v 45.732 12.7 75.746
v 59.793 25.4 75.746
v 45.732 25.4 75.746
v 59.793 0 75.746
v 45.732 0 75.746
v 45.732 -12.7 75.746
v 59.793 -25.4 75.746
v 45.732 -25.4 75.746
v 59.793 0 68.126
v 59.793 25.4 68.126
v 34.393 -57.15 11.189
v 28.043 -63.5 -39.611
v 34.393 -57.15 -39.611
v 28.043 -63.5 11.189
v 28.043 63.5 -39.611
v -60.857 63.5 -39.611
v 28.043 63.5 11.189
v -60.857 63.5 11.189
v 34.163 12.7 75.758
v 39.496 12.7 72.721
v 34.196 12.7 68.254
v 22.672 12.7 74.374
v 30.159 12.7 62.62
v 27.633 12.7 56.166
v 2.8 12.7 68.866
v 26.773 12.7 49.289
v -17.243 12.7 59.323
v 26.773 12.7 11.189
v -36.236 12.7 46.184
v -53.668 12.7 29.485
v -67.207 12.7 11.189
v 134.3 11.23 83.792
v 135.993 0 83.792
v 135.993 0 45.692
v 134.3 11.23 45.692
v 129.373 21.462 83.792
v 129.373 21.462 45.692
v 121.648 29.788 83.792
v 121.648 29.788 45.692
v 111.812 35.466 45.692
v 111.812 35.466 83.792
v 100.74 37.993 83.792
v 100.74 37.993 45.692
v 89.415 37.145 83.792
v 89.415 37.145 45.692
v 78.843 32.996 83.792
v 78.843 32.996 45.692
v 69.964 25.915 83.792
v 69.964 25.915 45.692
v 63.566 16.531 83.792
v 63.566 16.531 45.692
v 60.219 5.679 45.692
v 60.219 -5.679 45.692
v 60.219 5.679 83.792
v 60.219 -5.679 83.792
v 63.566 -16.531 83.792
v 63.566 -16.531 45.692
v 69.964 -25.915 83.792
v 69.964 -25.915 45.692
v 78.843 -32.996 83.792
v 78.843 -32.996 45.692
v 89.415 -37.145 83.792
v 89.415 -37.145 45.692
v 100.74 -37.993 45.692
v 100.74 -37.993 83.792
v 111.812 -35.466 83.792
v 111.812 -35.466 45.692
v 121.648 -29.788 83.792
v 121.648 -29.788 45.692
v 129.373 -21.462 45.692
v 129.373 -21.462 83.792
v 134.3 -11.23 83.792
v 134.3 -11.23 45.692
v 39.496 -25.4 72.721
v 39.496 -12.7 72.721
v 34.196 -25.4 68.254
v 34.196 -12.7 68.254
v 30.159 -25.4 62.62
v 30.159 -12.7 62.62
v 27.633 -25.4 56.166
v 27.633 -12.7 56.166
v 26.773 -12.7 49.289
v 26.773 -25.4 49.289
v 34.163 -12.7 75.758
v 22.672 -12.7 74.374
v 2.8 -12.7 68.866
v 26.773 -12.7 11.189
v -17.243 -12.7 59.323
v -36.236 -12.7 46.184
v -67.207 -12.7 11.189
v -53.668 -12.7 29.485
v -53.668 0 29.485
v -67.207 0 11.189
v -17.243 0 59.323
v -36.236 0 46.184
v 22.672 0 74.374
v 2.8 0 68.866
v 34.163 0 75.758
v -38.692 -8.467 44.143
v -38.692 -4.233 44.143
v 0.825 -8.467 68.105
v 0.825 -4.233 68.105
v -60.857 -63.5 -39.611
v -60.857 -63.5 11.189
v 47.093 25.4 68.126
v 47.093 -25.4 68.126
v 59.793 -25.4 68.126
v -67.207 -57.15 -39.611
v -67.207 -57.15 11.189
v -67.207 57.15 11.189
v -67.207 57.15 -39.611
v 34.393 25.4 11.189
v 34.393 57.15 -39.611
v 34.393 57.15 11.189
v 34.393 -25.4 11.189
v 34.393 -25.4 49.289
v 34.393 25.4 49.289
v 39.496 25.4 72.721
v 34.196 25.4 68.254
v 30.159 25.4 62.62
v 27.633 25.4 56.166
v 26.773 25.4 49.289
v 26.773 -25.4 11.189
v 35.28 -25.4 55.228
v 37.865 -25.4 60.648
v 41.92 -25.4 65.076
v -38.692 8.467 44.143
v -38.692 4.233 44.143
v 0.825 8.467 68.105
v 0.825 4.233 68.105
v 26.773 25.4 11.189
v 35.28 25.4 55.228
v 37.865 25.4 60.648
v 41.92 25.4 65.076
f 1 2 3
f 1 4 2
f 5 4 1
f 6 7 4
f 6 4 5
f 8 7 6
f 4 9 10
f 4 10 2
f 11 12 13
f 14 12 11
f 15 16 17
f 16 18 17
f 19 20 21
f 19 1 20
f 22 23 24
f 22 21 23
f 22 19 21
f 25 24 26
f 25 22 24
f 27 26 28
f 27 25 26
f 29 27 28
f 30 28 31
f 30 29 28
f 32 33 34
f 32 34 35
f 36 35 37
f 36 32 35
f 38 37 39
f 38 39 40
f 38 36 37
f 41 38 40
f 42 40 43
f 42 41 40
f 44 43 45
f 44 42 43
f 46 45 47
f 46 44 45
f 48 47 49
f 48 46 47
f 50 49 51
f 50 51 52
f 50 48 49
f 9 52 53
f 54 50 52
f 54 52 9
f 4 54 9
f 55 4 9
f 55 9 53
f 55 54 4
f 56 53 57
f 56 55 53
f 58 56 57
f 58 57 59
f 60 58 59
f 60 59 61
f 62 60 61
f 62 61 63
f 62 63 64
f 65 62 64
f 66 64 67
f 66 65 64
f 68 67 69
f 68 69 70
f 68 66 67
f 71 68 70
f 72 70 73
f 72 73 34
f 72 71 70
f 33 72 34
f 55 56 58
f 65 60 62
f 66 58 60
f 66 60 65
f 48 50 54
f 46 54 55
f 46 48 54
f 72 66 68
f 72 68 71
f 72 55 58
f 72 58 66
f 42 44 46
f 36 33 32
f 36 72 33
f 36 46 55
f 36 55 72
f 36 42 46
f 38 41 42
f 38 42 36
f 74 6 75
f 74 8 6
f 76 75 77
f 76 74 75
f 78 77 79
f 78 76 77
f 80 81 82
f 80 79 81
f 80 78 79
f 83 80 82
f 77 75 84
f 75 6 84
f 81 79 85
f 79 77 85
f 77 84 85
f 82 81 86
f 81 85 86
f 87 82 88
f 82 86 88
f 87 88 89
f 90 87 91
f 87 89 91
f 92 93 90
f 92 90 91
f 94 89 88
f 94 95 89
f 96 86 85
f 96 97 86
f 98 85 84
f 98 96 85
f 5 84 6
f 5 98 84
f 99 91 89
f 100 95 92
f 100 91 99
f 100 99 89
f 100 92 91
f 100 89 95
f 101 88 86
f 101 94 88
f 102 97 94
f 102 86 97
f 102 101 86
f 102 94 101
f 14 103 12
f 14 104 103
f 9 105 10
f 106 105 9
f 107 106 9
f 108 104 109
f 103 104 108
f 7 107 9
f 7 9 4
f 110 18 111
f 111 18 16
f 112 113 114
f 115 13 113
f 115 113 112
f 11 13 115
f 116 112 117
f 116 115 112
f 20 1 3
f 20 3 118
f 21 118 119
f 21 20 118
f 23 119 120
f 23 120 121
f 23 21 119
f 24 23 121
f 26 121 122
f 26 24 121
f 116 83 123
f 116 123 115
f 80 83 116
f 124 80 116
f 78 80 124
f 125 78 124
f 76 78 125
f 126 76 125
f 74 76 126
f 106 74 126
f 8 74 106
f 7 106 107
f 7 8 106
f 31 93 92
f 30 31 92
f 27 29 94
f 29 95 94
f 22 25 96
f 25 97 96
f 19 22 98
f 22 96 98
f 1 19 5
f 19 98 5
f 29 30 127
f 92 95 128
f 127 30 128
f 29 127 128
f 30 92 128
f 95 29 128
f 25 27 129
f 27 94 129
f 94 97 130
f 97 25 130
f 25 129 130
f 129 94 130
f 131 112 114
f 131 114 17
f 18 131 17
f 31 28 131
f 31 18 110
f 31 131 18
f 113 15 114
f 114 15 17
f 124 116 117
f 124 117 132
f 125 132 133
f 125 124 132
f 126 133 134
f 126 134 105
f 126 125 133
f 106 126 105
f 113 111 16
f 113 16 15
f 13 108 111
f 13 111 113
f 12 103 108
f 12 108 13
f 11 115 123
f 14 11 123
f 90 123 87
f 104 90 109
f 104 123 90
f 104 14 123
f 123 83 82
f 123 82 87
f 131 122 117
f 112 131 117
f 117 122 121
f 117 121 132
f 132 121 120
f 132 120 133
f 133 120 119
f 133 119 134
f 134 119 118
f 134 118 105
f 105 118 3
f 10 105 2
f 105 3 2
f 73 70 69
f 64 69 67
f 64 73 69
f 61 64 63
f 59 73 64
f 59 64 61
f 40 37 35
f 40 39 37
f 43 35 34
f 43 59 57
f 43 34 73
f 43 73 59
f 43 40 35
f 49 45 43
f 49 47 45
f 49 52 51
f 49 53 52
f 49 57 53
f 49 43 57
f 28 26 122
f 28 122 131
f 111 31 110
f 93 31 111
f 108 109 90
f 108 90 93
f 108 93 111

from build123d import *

# Parameters (mm, degrees)
F1_DEPTH = 63.5
F2_DEPTH = 25.4
F3_DEPTH = 12.7
F5_SIZE  = 6.35


with BuildPart() as f1:
    # F0 (on Front) → F1 (new body, symmetric)
    with BuildSketch(Plane.XZ):
        Polygon((26.772957, 11.188716), (-67.207043, 11.188716), (-67.207043, -39.611284), (34.392957, -39.611284), (34.392957, 11.188716), align=None)
    extrude(amount=F1_DEPTH, both=True)

    # F0 (on Front) → F2 (join, symmetric)
    with BuildSketch(Plane.XZ):
        with BuildLine():
            Line((26.772957, 49.288716), (26.772957, 11.188716))
            Line((26.772957, 11.188716), (34.392957, 11.188716))
            Line((34.392957, 11.188716), (34.392957, 49.288716))
            ThreePointArc((34.392957, 49.288716), (37.864503, 60.647941), (47.092957, 68.12586))
            Line((47.092957, 68.12586), (59.792957, 68.12586))
            Line((59.792957, 68.12586), (59.792957, 75.74586))
            Line((59.792957, 75.74586), (45.731692, 75.74586))
            ThreePointArc((45.731692, 75.74586), (32.001945, 65.563037), (26.772957, 49.288716))
        make_face()
    extrude(amount=F2_DEPTH, both=True)

    # F0 (on Front) → F3 (join, symmetric)
    with BuildSketch(Plane.XZ):
        with BuildLine():
            add(Edge.make_bspline(
                [(-67.207043, 11.188716), (-46.063684, 46.195824), (0, 78.709707), (45.731692, 75.74586)],
                knots=[0, 0, 0, 0, 130.087596, 130.087596, 130.087596, 130.087596], degree=3))
            Line((-67.207043, 11.188716), (26.772957, 11.188716))
            Line((26.772957, 11.188716), (26.772957, 49.288716))
            ThreePointArc((26.772957, 49.288716), (32.001945, 65.563037), (45.731692, 75.74586))
        make_face()
    extrude(amount=F3_DEPTH, both=True)

    # F0 (on Front) → F4 (revolve)
    with BuildSketch(Plane.XZ):
        Polygon((97.892957, 83.79226), (97.892957, 75.74586), (97.892957, 68.12586), (97.892957, 45.69226), (135.992957, 45.69226), (135.992957, 83.79226), align=None)
    revolve(axis=Axis((97.892957, 0, 79.76906), (0, 0, 1)))

    # F5
    f5_edges = [f1.edges().sort_by_distance(p)[0] for p in [
        (34.392957, -63.5, -14.211284),
        (-67.207043, -63.5, -14.211284),
        (34.392957, 63.5, -14.211284),
        (-67.207043, 63.5, -14.211284),
    ]]
    chamfer(f5_edges, length=F5_SIZE)


solid = f1.part
